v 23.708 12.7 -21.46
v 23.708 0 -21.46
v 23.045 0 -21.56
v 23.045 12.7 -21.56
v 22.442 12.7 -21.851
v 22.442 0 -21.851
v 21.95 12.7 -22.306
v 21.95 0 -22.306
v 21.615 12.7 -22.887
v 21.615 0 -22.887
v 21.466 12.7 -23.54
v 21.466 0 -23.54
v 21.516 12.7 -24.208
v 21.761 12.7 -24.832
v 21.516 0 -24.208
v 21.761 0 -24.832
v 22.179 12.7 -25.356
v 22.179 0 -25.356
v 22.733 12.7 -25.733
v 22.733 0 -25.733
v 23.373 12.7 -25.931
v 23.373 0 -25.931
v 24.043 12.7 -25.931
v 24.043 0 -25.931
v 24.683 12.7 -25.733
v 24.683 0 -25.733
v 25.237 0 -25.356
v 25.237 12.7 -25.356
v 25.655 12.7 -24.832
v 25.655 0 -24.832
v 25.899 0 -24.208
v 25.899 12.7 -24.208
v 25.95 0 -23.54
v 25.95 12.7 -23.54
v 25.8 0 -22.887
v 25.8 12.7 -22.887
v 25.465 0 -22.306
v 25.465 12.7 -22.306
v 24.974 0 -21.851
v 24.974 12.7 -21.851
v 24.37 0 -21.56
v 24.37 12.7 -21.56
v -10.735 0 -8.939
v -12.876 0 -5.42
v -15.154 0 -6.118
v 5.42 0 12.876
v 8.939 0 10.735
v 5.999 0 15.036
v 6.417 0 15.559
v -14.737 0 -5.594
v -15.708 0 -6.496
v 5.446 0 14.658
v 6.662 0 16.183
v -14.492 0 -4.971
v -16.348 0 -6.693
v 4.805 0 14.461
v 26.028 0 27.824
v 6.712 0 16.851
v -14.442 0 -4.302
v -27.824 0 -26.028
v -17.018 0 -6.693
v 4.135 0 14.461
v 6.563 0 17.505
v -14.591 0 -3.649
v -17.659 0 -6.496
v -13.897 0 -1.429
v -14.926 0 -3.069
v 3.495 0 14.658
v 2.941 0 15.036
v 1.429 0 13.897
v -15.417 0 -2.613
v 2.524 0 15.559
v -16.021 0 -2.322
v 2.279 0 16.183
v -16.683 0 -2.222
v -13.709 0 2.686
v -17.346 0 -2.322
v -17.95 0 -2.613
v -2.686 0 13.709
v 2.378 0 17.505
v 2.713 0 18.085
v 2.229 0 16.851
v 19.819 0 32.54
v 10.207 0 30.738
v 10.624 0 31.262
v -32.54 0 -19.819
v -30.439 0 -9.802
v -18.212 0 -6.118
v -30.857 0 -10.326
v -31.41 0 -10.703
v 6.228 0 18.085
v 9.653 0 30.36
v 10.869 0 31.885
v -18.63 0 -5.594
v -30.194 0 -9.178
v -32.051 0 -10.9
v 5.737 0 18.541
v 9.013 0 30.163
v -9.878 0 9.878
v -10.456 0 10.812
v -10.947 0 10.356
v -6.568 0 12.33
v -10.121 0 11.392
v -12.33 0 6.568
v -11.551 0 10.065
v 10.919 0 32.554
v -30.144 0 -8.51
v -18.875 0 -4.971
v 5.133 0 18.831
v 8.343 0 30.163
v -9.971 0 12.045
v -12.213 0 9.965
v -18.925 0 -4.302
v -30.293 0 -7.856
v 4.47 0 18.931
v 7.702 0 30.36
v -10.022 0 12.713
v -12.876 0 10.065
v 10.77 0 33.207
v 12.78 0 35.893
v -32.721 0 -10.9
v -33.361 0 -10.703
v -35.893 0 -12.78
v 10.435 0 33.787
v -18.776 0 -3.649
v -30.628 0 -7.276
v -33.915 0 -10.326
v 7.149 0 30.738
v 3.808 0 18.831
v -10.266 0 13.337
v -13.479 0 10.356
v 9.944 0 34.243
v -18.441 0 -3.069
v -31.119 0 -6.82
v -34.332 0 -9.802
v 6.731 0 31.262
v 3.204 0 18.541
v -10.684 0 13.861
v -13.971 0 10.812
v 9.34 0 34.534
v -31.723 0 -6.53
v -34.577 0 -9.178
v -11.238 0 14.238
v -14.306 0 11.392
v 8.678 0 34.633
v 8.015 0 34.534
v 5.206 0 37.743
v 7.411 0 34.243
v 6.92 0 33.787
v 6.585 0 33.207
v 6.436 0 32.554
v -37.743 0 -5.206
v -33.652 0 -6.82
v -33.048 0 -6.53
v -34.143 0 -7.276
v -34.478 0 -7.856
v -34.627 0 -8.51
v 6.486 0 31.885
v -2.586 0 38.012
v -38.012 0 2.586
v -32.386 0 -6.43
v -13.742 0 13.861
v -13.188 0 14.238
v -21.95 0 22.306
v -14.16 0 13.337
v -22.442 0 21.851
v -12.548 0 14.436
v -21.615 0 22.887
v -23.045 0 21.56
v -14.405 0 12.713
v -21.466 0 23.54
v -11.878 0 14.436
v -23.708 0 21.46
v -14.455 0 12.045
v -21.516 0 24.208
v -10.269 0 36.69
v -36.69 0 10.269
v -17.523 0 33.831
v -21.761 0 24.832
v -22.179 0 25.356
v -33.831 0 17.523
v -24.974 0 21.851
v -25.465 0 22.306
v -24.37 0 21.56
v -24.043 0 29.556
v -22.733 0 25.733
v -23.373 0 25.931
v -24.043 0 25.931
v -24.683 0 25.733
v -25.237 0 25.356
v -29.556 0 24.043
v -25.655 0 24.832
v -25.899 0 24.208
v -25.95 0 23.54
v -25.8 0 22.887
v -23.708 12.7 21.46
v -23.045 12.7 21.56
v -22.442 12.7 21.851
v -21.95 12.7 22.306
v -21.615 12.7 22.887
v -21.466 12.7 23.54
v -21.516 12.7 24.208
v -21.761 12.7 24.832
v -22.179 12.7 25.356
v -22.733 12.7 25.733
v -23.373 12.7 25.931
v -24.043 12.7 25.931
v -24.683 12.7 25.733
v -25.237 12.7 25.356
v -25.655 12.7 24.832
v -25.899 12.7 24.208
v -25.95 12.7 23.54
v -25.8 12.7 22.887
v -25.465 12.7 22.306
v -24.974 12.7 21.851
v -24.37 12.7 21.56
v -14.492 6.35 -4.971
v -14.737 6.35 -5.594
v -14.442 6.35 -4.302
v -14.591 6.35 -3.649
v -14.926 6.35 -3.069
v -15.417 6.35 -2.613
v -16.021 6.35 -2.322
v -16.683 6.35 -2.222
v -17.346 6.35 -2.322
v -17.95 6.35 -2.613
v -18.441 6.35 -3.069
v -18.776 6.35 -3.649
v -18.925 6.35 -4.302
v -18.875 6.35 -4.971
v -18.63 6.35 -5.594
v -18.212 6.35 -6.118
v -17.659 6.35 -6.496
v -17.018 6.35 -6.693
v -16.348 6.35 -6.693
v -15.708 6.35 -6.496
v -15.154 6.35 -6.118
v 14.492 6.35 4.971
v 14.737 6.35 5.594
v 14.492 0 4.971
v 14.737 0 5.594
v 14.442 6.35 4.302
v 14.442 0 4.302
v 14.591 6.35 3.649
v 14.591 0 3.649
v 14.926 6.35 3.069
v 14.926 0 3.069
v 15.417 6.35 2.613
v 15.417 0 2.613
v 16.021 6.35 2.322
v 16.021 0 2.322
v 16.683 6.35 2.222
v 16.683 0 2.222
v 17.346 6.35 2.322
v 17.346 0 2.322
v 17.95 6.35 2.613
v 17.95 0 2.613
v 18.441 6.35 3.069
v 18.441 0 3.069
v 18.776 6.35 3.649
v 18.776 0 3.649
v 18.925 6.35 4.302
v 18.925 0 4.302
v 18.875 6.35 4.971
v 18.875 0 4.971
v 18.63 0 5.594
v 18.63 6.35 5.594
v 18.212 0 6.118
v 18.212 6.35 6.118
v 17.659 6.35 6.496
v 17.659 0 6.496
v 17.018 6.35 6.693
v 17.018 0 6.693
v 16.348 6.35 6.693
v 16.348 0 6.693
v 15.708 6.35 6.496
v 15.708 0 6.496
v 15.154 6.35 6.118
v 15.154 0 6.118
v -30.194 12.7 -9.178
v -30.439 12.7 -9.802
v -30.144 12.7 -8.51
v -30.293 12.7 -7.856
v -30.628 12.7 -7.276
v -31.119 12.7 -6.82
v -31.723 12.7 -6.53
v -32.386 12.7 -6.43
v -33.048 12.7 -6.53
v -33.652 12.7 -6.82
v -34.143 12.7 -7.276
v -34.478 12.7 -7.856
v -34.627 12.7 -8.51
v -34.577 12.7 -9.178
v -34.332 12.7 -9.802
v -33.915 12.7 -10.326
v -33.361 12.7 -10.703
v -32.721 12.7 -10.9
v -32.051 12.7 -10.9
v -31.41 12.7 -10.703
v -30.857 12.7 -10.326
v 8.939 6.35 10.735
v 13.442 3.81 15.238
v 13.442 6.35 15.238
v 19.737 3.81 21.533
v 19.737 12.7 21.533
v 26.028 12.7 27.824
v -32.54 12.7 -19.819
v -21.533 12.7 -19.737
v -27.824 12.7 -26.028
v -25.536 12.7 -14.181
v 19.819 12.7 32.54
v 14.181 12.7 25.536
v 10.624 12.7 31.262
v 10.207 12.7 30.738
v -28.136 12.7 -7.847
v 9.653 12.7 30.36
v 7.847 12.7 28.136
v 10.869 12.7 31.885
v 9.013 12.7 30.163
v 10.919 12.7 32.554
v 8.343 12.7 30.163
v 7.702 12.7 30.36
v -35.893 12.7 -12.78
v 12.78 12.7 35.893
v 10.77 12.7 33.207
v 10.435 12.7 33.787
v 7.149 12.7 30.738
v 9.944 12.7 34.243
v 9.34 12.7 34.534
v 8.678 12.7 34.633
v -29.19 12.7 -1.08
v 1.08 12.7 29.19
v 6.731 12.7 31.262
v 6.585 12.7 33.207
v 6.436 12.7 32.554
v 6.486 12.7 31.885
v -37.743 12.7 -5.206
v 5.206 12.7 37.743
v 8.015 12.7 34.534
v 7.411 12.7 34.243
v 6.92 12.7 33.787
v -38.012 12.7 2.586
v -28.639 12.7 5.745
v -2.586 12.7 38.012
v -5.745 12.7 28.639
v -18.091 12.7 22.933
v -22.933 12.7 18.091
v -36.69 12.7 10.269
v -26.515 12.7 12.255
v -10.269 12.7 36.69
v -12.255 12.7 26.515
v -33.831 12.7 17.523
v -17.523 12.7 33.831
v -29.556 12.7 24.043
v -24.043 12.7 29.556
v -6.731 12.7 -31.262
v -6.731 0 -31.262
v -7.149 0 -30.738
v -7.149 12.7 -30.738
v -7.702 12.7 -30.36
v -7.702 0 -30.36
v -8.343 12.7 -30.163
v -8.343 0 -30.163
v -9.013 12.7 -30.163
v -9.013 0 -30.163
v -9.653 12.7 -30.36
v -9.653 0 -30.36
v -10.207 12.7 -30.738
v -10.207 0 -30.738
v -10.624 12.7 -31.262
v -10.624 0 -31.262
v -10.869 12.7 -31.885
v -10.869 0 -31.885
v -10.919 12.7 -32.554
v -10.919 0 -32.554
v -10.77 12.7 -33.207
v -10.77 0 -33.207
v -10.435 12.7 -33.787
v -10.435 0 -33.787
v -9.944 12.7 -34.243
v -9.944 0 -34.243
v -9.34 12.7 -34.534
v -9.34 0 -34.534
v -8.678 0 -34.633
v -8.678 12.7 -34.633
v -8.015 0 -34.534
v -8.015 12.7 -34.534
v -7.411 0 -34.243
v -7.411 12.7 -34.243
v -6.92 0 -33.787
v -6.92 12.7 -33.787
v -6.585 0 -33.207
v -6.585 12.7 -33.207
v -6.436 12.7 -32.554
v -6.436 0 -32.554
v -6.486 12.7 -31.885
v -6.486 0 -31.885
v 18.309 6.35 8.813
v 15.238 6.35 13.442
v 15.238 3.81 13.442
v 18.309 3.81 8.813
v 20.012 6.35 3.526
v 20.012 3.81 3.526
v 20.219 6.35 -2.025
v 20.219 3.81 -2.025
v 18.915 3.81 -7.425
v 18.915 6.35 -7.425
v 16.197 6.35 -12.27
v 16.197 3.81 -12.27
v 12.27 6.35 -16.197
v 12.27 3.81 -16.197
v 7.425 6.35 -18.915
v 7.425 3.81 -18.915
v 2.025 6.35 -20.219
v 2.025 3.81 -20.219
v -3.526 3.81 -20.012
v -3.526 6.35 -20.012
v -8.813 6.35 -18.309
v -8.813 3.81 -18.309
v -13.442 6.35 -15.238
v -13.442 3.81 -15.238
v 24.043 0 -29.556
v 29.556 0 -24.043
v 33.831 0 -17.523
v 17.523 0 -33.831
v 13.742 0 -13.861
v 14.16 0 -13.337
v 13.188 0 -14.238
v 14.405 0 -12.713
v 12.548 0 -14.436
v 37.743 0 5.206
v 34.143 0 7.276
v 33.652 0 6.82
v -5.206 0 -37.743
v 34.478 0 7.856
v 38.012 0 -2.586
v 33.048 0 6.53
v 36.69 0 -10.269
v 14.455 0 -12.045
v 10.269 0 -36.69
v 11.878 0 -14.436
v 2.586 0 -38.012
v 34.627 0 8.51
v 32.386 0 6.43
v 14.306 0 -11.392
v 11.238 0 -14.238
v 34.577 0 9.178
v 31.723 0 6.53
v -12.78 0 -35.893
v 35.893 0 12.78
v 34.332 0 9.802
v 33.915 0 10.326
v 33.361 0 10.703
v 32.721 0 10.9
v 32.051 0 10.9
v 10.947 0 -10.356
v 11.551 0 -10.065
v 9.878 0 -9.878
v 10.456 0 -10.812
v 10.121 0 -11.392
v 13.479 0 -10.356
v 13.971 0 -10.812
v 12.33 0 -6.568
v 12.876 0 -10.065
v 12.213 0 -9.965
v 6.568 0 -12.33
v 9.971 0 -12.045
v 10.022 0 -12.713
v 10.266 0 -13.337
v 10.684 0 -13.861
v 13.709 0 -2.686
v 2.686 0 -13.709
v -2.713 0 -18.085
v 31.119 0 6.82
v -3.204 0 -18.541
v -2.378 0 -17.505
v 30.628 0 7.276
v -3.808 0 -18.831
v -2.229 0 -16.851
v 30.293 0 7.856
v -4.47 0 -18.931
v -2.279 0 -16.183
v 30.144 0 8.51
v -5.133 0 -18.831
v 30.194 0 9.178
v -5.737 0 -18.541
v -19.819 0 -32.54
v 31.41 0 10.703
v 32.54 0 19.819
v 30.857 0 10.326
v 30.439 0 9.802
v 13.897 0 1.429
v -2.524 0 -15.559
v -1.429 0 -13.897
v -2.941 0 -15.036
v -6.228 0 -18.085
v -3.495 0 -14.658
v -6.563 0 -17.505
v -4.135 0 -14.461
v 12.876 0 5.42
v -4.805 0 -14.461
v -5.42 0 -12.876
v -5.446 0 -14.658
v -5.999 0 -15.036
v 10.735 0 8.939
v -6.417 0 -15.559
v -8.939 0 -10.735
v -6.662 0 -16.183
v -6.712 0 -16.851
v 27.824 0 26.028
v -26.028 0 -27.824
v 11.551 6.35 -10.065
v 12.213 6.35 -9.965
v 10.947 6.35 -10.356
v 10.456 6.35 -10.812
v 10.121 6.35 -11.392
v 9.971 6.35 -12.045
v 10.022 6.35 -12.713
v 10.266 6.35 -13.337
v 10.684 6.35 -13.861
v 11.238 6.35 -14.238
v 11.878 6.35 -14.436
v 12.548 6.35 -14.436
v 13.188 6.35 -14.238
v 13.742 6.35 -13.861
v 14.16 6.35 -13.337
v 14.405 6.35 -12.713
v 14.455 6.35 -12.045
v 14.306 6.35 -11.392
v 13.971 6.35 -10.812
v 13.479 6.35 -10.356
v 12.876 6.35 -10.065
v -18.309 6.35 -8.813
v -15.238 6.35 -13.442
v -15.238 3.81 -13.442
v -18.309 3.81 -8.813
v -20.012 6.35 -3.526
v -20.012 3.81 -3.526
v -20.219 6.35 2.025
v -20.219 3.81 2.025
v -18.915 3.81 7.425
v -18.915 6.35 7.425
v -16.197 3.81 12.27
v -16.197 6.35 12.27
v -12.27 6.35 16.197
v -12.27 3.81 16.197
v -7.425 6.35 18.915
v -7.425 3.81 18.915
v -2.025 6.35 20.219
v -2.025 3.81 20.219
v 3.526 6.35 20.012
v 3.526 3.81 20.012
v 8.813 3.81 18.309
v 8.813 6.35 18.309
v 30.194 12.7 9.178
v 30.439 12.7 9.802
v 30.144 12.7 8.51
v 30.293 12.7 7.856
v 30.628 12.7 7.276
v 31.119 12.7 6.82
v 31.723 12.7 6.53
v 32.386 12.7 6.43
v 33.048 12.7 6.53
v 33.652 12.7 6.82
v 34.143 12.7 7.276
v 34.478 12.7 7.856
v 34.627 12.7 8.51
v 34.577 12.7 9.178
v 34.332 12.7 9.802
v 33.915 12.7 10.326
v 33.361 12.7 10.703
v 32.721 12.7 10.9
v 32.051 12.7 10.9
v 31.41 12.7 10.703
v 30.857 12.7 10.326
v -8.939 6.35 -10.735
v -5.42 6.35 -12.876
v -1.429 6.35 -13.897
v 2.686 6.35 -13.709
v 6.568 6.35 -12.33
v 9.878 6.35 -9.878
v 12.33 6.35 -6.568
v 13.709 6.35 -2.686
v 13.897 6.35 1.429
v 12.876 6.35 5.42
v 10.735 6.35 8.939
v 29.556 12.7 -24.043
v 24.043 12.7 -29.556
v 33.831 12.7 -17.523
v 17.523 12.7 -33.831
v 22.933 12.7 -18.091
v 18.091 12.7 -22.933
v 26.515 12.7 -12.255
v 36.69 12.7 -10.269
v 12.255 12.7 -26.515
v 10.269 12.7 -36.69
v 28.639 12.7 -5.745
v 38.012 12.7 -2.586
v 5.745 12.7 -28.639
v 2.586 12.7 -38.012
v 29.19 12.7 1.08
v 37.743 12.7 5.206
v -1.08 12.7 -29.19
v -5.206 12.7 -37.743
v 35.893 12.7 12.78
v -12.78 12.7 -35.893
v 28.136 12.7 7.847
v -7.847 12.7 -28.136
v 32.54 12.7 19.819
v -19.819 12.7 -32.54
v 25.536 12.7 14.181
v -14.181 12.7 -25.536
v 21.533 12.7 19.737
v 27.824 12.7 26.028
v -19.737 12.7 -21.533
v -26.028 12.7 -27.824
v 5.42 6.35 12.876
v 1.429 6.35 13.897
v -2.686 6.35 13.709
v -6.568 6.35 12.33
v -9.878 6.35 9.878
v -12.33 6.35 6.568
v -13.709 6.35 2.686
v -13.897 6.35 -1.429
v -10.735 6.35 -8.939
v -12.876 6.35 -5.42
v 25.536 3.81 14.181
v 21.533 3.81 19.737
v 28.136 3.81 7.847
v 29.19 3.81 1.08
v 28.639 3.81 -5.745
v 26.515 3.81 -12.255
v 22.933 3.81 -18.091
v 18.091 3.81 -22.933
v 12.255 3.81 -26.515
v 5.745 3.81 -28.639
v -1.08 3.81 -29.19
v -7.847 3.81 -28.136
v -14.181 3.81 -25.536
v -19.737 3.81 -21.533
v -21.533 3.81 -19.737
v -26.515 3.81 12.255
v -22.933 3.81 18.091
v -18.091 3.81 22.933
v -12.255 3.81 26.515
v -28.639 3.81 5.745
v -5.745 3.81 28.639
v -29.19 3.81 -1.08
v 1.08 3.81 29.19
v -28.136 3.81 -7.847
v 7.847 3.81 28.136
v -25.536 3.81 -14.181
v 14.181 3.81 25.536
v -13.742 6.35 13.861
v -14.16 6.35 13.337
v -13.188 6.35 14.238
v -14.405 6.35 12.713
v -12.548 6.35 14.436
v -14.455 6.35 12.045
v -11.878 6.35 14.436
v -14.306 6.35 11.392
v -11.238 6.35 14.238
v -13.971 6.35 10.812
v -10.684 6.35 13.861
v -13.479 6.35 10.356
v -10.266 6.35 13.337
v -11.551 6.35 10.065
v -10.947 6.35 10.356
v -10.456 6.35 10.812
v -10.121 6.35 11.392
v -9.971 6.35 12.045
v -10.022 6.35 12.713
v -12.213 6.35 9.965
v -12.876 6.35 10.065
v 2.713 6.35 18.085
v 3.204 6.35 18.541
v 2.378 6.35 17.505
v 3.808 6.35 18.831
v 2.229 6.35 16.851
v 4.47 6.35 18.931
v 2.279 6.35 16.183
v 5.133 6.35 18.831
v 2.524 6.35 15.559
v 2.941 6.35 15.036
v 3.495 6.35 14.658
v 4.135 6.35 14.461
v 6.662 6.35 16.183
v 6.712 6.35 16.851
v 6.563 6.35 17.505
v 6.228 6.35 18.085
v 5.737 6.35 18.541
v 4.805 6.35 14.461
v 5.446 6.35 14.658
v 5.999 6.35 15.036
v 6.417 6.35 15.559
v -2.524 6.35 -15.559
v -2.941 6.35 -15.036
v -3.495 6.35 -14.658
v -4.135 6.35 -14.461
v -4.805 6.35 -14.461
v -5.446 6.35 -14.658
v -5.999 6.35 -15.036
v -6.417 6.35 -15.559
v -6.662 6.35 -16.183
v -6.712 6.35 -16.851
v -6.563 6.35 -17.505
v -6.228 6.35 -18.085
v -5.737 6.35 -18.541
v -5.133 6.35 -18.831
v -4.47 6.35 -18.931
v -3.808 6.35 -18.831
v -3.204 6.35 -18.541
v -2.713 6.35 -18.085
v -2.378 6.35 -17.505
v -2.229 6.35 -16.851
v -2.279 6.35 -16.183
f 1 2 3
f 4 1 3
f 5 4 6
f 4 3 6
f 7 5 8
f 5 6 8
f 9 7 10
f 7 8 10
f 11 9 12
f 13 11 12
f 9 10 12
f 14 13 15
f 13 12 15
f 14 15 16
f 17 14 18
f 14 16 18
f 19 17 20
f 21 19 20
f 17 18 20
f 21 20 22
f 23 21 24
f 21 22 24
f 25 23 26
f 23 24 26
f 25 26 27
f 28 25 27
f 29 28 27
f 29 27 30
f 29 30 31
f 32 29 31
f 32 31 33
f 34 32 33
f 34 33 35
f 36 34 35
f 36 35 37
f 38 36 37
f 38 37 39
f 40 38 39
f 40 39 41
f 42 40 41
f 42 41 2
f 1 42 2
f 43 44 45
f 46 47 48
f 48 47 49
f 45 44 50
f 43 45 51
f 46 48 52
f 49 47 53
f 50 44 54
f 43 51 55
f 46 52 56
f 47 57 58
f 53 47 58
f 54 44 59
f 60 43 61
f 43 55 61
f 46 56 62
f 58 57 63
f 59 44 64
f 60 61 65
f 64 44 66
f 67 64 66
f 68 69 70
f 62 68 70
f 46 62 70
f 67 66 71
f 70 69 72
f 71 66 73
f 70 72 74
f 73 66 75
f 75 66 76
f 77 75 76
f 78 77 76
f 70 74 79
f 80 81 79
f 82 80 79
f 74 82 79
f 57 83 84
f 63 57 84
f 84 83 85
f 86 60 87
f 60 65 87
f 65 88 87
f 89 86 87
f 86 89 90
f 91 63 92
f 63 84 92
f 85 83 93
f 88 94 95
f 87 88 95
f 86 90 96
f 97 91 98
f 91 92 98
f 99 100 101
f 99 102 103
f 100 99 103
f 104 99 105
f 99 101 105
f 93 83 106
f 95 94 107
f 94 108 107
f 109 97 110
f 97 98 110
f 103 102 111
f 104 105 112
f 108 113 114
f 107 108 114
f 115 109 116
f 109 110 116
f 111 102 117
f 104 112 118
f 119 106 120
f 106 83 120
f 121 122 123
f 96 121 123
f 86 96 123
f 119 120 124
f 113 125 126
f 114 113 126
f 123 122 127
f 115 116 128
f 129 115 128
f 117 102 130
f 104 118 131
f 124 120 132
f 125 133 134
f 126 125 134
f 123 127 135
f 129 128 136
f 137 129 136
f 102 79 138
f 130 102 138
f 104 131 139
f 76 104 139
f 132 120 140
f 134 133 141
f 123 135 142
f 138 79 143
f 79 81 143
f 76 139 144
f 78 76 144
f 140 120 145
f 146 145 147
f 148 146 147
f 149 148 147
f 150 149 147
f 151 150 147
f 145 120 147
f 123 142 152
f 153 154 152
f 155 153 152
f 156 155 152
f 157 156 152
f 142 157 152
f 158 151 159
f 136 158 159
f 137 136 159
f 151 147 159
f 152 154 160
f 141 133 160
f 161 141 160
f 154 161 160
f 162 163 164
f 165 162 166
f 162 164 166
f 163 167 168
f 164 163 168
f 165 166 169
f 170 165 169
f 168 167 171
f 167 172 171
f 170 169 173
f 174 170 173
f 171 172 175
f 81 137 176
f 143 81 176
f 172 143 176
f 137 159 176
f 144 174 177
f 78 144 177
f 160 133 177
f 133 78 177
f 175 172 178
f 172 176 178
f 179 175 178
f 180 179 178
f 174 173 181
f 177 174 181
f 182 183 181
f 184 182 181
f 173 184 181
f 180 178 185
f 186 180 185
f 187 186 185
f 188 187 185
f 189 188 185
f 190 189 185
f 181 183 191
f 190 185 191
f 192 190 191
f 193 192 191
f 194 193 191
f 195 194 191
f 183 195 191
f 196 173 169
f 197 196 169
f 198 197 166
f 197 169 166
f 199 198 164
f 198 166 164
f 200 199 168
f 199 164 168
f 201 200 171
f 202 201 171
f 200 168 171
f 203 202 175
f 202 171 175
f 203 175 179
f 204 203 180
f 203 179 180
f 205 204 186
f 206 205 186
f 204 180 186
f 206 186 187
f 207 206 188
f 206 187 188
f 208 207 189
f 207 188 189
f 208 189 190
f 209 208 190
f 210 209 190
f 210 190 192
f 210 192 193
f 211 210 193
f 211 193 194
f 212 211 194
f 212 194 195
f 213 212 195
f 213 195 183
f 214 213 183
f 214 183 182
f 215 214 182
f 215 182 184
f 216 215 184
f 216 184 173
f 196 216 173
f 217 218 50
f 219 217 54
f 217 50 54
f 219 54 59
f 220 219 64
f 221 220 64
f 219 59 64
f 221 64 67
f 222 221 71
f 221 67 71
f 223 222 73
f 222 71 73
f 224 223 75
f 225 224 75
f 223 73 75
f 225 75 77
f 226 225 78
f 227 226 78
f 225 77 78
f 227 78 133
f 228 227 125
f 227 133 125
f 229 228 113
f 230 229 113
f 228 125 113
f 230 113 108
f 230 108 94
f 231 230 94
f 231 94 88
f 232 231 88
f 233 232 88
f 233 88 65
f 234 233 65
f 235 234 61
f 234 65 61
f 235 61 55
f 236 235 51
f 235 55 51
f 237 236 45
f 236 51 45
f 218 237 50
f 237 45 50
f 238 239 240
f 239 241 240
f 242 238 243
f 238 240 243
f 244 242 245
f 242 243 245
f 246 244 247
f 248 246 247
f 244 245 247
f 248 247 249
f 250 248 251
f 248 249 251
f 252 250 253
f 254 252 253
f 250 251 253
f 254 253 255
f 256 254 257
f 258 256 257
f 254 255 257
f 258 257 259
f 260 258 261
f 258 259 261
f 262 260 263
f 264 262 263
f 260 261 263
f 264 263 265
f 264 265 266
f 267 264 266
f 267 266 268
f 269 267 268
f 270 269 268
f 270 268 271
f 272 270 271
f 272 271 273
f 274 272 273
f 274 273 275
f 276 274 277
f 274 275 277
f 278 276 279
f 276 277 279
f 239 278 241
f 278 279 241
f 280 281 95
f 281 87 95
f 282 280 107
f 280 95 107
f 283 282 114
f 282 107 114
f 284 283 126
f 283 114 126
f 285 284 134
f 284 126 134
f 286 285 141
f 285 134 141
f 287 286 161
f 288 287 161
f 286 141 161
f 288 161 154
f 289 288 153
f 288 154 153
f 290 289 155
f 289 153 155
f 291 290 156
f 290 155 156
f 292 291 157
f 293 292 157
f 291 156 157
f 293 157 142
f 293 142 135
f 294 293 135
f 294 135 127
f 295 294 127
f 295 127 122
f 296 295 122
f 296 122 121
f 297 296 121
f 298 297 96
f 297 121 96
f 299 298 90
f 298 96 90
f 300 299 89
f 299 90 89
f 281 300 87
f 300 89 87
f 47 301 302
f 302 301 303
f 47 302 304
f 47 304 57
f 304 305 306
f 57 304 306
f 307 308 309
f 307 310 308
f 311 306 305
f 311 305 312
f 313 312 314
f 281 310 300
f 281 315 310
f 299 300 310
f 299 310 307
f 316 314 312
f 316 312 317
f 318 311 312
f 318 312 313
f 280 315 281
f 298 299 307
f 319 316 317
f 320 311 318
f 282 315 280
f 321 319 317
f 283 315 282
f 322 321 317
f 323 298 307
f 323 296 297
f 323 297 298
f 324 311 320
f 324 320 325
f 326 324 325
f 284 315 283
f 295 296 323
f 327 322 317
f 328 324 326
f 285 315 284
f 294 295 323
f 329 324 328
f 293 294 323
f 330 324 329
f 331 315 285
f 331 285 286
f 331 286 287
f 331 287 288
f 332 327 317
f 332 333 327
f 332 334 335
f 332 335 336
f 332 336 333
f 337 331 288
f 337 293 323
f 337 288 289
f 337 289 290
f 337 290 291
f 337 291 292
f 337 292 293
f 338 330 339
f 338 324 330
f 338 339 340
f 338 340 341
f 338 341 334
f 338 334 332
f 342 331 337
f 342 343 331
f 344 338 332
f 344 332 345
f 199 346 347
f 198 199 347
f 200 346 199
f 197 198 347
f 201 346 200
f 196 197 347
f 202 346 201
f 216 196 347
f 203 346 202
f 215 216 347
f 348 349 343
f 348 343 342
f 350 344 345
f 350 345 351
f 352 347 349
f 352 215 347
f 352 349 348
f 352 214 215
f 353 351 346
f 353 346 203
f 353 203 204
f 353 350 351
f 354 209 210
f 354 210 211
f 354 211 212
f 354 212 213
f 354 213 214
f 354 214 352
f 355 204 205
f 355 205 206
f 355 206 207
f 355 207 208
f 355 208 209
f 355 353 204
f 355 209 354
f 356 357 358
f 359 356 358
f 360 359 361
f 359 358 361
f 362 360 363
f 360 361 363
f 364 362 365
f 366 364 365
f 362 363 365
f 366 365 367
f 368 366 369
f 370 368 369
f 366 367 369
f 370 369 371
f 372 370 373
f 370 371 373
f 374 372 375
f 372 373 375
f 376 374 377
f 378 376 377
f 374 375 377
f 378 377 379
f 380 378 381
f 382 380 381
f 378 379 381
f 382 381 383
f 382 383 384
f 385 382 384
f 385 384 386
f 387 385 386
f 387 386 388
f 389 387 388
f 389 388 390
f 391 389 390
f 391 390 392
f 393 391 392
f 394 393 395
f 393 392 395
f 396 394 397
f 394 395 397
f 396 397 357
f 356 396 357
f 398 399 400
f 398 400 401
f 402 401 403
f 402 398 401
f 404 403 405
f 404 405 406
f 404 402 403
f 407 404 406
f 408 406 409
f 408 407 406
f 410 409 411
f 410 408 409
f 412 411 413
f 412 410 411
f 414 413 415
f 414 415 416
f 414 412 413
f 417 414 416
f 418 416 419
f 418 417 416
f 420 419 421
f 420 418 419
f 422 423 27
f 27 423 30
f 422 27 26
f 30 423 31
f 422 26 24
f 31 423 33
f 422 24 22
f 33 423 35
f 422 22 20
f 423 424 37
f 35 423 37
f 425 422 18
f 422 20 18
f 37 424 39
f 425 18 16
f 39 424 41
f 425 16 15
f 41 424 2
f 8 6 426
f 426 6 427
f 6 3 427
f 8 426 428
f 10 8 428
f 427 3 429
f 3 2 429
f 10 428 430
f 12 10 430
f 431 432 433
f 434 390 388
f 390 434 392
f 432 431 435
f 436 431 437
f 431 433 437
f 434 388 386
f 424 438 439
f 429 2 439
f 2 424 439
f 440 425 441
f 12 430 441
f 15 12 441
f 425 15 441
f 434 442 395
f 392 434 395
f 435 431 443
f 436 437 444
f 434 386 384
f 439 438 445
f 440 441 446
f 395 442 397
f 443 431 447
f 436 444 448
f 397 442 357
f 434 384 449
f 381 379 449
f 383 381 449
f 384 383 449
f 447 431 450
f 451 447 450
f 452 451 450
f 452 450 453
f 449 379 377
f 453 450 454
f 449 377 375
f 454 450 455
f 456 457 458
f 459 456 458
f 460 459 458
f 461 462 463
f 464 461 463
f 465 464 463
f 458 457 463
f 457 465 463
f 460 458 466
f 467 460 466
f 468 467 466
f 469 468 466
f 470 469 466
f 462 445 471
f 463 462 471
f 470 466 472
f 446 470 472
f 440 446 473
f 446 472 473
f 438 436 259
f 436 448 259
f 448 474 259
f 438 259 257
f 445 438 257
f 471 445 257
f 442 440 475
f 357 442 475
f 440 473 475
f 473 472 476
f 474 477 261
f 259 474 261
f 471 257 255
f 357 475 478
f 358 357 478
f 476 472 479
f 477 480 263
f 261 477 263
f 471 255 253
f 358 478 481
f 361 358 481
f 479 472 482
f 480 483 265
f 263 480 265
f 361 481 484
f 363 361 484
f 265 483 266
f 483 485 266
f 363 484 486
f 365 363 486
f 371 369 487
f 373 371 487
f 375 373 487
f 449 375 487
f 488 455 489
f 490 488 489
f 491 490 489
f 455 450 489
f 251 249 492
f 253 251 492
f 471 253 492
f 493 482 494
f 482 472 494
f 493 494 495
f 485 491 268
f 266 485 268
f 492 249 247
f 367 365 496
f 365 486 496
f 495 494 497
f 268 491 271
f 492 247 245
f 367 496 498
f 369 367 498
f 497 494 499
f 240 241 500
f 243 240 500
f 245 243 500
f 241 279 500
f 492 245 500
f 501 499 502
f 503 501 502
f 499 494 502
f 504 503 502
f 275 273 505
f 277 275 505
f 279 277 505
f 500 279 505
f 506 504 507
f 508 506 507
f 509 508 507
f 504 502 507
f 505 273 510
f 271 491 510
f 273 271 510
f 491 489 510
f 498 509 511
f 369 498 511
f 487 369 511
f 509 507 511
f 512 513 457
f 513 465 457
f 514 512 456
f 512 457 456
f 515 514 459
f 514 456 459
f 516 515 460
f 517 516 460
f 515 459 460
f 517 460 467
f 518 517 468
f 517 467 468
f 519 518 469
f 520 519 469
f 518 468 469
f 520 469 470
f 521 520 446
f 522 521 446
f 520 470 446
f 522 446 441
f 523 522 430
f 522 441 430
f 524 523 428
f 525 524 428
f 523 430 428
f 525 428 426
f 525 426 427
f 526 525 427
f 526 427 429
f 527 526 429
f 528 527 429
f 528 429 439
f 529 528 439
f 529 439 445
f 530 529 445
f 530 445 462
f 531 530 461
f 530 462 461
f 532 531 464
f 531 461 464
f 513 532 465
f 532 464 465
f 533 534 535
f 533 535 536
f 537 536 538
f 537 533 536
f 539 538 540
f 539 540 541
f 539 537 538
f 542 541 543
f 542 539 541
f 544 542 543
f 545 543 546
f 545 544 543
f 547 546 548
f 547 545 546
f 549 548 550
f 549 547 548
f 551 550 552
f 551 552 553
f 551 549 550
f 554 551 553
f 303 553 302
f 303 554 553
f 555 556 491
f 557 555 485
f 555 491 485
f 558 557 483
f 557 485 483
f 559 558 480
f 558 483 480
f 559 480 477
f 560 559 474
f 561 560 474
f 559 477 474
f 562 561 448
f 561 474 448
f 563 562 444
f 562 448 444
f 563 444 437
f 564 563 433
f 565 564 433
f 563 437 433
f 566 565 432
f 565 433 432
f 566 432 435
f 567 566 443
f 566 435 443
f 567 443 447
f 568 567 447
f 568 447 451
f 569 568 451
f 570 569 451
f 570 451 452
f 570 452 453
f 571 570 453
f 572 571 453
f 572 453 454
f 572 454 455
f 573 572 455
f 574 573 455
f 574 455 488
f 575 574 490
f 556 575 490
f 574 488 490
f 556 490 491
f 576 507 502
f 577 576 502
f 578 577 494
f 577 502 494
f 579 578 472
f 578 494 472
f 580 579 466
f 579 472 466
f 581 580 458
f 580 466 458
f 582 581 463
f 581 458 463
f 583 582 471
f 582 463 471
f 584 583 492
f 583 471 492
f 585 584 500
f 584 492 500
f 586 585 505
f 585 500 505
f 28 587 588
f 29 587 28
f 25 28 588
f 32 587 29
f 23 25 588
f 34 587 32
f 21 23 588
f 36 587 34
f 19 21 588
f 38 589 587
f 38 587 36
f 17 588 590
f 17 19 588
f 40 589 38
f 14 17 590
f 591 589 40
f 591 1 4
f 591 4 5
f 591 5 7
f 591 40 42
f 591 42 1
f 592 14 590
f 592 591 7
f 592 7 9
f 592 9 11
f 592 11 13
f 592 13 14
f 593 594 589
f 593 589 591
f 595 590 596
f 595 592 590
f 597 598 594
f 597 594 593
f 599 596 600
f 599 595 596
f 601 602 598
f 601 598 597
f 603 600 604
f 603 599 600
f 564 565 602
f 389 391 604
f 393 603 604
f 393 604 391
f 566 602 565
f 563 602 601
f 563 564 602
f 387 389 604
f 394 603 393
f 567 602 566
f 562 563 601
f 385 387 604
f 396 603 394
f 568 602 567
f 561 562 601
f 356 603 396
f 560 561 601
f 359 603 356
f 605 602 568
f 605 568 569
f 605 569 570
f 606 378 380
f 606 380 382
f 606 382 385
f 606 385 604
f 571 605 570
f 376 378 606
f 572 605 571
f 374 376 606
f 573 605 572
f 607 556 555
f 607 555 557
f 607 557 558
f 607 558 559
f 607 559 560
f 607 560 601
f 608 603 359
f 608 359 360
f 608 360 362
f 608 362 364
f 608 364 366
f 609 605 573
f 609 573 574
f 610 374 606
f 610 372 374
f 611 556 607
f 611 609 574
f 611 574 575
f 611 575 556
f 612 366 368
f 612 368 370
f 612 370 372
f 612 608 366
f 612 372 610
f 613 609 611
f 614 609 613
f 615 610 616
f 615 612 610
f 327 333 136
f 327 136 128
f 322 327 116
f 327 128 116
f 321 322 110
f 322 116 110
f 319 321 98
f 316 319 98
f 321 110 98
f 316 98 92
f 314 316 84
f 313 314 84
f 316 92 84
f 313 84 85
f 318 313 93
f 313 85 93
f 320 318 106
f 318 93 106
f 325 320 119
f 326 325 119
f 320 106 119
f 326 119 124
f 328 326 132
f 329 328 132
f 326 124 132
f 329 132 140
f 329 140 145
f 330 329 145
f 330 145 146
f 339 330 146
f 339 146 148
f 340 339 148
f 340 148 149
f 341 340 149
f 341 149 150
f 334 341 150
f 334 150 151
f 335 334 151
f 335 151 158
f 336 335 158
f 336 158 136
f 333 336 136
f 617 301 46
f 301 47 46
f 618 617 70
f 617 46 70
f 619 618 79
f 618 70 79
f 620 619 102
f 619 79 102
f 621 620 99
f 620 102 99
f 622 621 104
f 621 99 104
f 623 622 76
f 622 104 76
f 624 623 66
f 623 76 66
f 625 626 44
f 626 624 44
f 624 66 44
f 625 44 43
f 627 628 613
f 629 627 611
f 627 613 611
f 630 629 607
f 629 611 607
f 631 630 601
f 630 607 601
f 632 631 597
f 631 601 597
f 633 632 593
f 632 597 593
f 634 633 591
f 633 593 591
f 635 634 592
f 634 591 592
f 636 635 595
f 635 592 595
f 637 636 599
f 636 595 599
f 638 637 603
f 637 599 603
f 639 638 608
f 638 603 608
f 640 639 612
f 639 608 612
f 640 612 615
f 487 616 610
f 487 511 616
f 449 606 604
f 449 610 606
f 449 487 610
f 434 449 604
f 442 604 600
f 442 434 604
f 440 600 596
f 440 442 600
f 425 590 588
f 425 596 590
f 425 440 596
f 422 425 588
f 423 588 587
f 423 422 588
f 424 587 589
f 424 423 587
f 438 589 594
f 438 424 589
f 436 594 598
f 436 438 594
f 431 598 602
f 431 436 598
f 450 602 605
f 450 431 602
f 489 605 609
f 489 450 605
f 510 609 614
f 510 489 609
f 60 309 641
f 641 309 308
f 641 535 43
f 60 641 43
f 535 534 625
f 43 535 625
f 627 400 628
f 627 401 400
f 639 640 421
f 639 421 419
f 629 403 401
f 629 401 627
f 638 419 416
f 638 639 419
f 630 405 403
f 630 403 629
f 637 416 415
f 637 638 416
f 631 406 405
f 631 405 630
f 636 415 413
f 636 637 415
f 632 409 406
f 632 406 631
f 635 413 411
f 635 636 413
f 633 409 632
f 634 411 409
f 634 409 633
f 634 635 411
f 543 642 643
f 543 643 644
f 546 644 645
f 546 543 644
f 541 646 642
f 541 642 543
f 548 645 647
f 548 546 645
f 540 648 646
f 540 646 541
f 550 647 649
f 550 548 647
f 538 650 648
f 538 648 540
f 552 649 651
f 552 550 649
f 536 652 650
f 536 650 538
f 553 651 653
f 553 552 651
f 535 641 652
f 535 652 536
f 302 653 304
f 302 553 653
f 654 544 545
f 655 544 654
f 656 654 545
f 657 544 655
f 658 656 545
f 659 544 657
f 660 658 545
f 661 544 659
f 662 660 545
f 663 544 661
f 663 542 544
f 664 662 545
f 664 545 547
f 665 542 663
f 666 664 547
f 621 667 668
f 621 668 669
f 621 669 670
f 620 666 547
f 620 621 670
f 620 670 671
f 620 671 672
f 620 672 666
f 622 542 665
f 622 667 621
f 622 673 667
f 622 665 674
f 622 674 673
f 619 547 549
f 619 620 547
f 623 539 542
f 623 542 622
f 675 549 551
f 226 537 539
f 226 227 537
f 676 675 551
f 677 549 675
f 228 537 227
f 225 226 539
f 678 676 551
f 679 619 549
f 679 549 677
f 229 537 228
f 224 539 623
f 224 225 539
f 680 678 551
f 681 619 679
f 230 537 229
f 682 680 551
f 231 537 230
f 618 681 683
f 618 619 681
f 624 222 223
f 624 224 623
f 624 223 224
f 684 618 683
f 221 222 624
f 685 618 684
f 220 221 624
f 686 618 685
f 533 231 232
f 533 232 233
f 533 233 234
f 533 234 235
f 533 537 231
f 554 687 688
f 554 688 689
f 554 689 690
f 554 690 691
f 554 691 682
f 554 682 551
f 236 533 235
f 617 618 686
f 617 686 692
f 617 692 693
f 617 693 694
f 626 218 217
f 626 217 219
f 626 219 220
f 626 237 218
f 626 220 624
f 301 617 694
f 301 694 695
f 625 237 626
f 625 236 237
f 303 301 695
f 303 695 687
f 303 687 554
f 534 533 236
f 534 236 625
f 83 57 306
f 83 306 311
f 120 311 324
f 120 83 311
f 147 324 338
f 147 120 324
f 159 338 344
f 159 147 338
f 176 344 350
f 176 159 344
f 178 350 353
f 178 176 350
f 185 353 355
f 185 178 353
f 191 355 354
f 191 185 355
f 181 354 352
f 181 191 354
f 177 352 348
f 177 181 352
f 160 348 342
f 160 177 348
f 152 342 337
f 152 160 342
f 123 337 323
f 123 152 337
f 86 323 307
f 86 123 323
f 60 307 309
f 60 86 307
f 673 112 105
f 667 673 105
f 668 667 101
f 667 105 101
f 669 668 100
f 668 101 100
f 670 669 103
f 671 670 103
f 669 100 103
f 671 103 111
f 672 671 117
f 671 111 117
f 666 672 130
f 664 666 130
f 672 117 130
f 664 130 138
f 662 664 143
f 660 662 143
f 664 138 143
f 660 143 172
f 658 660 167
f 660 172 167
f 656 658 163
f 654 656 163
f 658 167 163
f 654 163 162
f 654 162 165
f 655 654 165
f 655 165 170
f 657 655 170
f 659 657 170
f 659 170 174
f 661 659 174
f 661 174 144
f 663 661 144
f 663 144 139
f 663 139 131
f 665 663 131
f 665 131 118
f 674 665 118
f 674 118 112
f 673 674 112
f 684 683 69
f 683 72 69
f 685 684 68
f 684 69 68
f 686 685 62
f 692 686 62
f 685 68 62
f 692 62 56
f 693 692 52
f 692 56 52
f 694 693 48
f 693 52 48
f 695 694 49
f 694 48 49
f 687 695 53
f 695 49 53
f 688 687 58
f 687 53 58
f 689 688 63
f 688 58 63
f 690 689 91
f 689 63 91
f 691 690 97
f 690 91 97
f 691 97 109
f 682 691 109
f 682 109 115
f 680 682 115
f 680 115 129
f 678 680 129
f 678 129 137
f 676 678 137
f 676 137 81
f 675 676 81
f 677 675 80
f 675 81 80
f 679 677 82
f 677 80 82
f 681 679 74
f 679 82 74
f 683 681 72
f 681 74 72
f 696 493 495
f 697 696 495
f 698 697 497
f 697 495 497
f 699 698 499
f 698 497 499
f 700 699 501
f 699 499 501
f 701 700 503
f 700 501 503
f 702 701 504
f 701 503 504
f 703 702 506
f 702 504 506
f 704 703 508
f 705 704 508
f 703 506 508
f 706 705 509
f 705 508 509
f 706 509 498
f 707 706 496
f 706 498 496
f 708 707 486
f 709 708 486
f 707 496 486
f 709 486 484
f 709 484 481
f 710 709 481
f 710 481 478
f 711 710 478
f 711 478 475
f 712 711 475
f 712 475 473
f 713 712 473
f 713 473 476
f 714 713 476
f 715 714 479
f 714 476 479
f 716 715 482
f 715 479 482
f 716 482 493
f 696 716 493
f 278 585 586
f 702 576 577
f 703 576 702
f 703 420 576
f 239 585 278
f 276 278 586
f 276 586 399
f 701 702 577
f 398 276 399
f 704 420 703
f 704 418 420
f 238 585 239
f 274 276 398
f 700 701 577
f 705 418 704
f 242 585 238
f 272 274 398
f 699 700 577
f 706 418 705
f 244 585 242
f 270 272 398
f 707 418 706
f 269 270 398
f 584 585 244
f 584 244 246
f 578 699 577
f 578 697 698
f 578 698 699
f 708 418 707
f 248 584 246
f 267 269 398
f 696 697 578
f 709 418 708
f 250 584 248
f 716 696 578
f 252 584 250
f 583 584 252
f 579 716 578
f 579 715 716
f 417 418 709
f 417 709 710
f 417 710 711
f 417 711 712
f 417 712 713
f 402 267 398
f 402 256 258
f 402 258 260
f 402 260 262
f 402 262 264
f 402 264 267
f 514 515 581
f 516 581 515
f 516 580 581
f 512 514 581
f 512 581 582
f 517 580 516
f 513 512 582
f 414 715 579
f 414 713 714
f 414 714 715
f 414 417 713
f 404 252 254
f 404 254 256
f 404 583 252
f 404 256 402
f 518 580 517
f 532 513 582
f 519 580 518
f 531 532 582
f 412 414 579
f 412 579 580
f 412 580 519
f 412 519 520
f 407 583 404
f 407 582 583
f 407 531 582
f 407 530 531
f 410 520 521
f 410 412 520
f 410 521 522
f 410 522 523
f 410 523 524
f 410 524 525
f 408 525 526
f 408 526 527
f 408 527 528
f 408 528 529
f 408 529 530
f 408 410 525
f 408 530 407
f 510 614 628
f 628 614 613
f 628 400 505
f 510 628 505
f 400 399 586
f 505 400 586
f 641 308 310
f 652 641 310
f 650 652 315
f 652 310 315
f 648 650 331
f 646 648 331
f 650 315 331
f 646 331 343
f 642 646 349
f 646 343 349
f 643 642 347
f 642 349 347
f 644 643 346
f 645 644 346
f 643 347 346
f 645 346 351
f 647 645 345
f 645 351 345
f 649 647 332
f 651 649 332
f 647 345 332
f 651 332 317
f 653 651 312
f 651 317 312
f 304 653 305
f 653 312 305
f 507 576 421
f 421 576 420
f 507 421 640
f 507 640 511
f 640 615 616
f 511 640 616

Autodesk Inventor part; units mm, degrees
ref_plane "YZ Plane" through (0, 0, 0) normal (1, 0, 0) x (0, 1, 0)
ref_plane "XZ Plane" through (0, 0, 0) normal (0, 1, 0) x (-1, 0, 0)
ref_plane "XY Plane" through (0, 0, 0) normal (0, 0, 1) x (1, 0, 0)
sketch "Sketch1" plane through (0, 0, 0) normal (0, 1, 0) x (-1, 0, 0)
  circle A0 centre (0, 0) radius 13.97
  circle A1 centre (0, 0) radius 38.1
  dimension "d0" = 27.94
  dimension "d1" = 76.2
extrude "Extrusion1" add sketch "Sketch1" along normal blind 12.7
sketch "Sketch2" plane through (0, 12.7, 0) normal (0, 1, 0) x (1, 0, 0)
  circle A0 centre (0, 0) radius 20.32
  circle A1 centre (0, 0) radius 13.97 projected
  circle A2 centre (0, 0) radius 29.21
  circle A3 centre (0, 0) radius 38.1 projected
  dimension "d4" = 6.35
  dimension "d63" = 58.42
extrude "Extrusion2" cut sketch "Sketch2" against normal blind 8.89 contours A2
sketch "Sketch3" plane through (0, 12.7, 0) normal (0, 1, 0) x (1, 0, 0)
  line L0 (0, 0) -> (12.2131, 12.2131) construction
  line L1 (0, 0) -> (17.272, 0) construction
  dimension "d7" = 17.272
  dimension "d8" = 45
hole "Hole1" at (12.2131, 12.7, -12.2131) direction (0, -1, 0) diameter 4.4958 depth 25.4 tip angle 118 clearance for "Flat Head Machine Screw (82)" size "#8" standard "Ansi Unified Screw Threads"
pattern_circular "Circular Pattern1" count 6 over 360 about axis through (0, 0, 0) along (0, 1, 0) of "Hole1"
sketch "Sketch8" plane through (0, 12.7, 0) normal (0, 1, 0) x (1, 0, 0)
  circle A0 centre (0, 0) radius 20.32
  circle A1 centre (0, 0) radius 20.32 projected
extrude "Extrusion5" cut sketch "Sketch8" against normal blind 6.35
sketch "Sketch9" plane through (0, 12.7, 0) normal (0, 1, 0) x (1, 0, 0)
  circle A0 centre (0, 0) radius 38.1 construction
  circle A1 centre (0, 0) radius 38.1 construction
  circle A2 centre (0, 0) radius 33.528 construction
  line L0 (0, 0) -> (23.7079, 23.7079) construction
  line L1 (0, 0) -> (33.528, 0) construction
  dimension "d47" = 4.572
  dimension "d48" = 45
hole "Hole3" at (23.7079, 12.7, -23.7079) direction (0, -1, 0) diameter 4.4958 depth 25.4 tip angle 118 clearance for "Flat Head Machine Screw (82)" size "#8" standard "Ansi Unified Screw Threads"
pattern_circular "Circular Pattern3" count 6 over 360 about axis through (0, 0, 0) along (0, 1, 0) of "Hole3"
sketch "Sketch10" plane through (0, 12.7, 0) normal (0, 1, 0) x (1, 0, 0)
  line L0 (27.8388, -26.0427) -> (-26.0427, 27.8388)
  line L1 (-26.0427, 27.8388) -> (-27.8388, 26.0427)
  line L2 (-27.8388, 26.0427) -> (26.0427, -27.8388)
  line L3 (26.0427, -27.8388) -> (27.8388, -26.0427)
  line L4 (27.8388, -26.0427) -> (-27.8388, 26.0427) construction
  line L5 (-26.0427, 27.8388) -> (26.0427, -27.8388) construction
  line L6 (27.8388, -26.0427) -> (104.0388, -26.0427) construction
  circle A0 centre (0, 0) radius 38.1 projected
  dimension "d59" = 135
  dimension "d60" = 2.54
extrude "Extrusion6" cut sketch "Sketch10" against normal up to surface (12.7 mm away) contours L3 A0 L0 | A0 L2 L0 | L3 L2 A0 | A0 L1 L0 | A0 L2 L1
properties part number "heatsink" material "Aluminum 6061"
